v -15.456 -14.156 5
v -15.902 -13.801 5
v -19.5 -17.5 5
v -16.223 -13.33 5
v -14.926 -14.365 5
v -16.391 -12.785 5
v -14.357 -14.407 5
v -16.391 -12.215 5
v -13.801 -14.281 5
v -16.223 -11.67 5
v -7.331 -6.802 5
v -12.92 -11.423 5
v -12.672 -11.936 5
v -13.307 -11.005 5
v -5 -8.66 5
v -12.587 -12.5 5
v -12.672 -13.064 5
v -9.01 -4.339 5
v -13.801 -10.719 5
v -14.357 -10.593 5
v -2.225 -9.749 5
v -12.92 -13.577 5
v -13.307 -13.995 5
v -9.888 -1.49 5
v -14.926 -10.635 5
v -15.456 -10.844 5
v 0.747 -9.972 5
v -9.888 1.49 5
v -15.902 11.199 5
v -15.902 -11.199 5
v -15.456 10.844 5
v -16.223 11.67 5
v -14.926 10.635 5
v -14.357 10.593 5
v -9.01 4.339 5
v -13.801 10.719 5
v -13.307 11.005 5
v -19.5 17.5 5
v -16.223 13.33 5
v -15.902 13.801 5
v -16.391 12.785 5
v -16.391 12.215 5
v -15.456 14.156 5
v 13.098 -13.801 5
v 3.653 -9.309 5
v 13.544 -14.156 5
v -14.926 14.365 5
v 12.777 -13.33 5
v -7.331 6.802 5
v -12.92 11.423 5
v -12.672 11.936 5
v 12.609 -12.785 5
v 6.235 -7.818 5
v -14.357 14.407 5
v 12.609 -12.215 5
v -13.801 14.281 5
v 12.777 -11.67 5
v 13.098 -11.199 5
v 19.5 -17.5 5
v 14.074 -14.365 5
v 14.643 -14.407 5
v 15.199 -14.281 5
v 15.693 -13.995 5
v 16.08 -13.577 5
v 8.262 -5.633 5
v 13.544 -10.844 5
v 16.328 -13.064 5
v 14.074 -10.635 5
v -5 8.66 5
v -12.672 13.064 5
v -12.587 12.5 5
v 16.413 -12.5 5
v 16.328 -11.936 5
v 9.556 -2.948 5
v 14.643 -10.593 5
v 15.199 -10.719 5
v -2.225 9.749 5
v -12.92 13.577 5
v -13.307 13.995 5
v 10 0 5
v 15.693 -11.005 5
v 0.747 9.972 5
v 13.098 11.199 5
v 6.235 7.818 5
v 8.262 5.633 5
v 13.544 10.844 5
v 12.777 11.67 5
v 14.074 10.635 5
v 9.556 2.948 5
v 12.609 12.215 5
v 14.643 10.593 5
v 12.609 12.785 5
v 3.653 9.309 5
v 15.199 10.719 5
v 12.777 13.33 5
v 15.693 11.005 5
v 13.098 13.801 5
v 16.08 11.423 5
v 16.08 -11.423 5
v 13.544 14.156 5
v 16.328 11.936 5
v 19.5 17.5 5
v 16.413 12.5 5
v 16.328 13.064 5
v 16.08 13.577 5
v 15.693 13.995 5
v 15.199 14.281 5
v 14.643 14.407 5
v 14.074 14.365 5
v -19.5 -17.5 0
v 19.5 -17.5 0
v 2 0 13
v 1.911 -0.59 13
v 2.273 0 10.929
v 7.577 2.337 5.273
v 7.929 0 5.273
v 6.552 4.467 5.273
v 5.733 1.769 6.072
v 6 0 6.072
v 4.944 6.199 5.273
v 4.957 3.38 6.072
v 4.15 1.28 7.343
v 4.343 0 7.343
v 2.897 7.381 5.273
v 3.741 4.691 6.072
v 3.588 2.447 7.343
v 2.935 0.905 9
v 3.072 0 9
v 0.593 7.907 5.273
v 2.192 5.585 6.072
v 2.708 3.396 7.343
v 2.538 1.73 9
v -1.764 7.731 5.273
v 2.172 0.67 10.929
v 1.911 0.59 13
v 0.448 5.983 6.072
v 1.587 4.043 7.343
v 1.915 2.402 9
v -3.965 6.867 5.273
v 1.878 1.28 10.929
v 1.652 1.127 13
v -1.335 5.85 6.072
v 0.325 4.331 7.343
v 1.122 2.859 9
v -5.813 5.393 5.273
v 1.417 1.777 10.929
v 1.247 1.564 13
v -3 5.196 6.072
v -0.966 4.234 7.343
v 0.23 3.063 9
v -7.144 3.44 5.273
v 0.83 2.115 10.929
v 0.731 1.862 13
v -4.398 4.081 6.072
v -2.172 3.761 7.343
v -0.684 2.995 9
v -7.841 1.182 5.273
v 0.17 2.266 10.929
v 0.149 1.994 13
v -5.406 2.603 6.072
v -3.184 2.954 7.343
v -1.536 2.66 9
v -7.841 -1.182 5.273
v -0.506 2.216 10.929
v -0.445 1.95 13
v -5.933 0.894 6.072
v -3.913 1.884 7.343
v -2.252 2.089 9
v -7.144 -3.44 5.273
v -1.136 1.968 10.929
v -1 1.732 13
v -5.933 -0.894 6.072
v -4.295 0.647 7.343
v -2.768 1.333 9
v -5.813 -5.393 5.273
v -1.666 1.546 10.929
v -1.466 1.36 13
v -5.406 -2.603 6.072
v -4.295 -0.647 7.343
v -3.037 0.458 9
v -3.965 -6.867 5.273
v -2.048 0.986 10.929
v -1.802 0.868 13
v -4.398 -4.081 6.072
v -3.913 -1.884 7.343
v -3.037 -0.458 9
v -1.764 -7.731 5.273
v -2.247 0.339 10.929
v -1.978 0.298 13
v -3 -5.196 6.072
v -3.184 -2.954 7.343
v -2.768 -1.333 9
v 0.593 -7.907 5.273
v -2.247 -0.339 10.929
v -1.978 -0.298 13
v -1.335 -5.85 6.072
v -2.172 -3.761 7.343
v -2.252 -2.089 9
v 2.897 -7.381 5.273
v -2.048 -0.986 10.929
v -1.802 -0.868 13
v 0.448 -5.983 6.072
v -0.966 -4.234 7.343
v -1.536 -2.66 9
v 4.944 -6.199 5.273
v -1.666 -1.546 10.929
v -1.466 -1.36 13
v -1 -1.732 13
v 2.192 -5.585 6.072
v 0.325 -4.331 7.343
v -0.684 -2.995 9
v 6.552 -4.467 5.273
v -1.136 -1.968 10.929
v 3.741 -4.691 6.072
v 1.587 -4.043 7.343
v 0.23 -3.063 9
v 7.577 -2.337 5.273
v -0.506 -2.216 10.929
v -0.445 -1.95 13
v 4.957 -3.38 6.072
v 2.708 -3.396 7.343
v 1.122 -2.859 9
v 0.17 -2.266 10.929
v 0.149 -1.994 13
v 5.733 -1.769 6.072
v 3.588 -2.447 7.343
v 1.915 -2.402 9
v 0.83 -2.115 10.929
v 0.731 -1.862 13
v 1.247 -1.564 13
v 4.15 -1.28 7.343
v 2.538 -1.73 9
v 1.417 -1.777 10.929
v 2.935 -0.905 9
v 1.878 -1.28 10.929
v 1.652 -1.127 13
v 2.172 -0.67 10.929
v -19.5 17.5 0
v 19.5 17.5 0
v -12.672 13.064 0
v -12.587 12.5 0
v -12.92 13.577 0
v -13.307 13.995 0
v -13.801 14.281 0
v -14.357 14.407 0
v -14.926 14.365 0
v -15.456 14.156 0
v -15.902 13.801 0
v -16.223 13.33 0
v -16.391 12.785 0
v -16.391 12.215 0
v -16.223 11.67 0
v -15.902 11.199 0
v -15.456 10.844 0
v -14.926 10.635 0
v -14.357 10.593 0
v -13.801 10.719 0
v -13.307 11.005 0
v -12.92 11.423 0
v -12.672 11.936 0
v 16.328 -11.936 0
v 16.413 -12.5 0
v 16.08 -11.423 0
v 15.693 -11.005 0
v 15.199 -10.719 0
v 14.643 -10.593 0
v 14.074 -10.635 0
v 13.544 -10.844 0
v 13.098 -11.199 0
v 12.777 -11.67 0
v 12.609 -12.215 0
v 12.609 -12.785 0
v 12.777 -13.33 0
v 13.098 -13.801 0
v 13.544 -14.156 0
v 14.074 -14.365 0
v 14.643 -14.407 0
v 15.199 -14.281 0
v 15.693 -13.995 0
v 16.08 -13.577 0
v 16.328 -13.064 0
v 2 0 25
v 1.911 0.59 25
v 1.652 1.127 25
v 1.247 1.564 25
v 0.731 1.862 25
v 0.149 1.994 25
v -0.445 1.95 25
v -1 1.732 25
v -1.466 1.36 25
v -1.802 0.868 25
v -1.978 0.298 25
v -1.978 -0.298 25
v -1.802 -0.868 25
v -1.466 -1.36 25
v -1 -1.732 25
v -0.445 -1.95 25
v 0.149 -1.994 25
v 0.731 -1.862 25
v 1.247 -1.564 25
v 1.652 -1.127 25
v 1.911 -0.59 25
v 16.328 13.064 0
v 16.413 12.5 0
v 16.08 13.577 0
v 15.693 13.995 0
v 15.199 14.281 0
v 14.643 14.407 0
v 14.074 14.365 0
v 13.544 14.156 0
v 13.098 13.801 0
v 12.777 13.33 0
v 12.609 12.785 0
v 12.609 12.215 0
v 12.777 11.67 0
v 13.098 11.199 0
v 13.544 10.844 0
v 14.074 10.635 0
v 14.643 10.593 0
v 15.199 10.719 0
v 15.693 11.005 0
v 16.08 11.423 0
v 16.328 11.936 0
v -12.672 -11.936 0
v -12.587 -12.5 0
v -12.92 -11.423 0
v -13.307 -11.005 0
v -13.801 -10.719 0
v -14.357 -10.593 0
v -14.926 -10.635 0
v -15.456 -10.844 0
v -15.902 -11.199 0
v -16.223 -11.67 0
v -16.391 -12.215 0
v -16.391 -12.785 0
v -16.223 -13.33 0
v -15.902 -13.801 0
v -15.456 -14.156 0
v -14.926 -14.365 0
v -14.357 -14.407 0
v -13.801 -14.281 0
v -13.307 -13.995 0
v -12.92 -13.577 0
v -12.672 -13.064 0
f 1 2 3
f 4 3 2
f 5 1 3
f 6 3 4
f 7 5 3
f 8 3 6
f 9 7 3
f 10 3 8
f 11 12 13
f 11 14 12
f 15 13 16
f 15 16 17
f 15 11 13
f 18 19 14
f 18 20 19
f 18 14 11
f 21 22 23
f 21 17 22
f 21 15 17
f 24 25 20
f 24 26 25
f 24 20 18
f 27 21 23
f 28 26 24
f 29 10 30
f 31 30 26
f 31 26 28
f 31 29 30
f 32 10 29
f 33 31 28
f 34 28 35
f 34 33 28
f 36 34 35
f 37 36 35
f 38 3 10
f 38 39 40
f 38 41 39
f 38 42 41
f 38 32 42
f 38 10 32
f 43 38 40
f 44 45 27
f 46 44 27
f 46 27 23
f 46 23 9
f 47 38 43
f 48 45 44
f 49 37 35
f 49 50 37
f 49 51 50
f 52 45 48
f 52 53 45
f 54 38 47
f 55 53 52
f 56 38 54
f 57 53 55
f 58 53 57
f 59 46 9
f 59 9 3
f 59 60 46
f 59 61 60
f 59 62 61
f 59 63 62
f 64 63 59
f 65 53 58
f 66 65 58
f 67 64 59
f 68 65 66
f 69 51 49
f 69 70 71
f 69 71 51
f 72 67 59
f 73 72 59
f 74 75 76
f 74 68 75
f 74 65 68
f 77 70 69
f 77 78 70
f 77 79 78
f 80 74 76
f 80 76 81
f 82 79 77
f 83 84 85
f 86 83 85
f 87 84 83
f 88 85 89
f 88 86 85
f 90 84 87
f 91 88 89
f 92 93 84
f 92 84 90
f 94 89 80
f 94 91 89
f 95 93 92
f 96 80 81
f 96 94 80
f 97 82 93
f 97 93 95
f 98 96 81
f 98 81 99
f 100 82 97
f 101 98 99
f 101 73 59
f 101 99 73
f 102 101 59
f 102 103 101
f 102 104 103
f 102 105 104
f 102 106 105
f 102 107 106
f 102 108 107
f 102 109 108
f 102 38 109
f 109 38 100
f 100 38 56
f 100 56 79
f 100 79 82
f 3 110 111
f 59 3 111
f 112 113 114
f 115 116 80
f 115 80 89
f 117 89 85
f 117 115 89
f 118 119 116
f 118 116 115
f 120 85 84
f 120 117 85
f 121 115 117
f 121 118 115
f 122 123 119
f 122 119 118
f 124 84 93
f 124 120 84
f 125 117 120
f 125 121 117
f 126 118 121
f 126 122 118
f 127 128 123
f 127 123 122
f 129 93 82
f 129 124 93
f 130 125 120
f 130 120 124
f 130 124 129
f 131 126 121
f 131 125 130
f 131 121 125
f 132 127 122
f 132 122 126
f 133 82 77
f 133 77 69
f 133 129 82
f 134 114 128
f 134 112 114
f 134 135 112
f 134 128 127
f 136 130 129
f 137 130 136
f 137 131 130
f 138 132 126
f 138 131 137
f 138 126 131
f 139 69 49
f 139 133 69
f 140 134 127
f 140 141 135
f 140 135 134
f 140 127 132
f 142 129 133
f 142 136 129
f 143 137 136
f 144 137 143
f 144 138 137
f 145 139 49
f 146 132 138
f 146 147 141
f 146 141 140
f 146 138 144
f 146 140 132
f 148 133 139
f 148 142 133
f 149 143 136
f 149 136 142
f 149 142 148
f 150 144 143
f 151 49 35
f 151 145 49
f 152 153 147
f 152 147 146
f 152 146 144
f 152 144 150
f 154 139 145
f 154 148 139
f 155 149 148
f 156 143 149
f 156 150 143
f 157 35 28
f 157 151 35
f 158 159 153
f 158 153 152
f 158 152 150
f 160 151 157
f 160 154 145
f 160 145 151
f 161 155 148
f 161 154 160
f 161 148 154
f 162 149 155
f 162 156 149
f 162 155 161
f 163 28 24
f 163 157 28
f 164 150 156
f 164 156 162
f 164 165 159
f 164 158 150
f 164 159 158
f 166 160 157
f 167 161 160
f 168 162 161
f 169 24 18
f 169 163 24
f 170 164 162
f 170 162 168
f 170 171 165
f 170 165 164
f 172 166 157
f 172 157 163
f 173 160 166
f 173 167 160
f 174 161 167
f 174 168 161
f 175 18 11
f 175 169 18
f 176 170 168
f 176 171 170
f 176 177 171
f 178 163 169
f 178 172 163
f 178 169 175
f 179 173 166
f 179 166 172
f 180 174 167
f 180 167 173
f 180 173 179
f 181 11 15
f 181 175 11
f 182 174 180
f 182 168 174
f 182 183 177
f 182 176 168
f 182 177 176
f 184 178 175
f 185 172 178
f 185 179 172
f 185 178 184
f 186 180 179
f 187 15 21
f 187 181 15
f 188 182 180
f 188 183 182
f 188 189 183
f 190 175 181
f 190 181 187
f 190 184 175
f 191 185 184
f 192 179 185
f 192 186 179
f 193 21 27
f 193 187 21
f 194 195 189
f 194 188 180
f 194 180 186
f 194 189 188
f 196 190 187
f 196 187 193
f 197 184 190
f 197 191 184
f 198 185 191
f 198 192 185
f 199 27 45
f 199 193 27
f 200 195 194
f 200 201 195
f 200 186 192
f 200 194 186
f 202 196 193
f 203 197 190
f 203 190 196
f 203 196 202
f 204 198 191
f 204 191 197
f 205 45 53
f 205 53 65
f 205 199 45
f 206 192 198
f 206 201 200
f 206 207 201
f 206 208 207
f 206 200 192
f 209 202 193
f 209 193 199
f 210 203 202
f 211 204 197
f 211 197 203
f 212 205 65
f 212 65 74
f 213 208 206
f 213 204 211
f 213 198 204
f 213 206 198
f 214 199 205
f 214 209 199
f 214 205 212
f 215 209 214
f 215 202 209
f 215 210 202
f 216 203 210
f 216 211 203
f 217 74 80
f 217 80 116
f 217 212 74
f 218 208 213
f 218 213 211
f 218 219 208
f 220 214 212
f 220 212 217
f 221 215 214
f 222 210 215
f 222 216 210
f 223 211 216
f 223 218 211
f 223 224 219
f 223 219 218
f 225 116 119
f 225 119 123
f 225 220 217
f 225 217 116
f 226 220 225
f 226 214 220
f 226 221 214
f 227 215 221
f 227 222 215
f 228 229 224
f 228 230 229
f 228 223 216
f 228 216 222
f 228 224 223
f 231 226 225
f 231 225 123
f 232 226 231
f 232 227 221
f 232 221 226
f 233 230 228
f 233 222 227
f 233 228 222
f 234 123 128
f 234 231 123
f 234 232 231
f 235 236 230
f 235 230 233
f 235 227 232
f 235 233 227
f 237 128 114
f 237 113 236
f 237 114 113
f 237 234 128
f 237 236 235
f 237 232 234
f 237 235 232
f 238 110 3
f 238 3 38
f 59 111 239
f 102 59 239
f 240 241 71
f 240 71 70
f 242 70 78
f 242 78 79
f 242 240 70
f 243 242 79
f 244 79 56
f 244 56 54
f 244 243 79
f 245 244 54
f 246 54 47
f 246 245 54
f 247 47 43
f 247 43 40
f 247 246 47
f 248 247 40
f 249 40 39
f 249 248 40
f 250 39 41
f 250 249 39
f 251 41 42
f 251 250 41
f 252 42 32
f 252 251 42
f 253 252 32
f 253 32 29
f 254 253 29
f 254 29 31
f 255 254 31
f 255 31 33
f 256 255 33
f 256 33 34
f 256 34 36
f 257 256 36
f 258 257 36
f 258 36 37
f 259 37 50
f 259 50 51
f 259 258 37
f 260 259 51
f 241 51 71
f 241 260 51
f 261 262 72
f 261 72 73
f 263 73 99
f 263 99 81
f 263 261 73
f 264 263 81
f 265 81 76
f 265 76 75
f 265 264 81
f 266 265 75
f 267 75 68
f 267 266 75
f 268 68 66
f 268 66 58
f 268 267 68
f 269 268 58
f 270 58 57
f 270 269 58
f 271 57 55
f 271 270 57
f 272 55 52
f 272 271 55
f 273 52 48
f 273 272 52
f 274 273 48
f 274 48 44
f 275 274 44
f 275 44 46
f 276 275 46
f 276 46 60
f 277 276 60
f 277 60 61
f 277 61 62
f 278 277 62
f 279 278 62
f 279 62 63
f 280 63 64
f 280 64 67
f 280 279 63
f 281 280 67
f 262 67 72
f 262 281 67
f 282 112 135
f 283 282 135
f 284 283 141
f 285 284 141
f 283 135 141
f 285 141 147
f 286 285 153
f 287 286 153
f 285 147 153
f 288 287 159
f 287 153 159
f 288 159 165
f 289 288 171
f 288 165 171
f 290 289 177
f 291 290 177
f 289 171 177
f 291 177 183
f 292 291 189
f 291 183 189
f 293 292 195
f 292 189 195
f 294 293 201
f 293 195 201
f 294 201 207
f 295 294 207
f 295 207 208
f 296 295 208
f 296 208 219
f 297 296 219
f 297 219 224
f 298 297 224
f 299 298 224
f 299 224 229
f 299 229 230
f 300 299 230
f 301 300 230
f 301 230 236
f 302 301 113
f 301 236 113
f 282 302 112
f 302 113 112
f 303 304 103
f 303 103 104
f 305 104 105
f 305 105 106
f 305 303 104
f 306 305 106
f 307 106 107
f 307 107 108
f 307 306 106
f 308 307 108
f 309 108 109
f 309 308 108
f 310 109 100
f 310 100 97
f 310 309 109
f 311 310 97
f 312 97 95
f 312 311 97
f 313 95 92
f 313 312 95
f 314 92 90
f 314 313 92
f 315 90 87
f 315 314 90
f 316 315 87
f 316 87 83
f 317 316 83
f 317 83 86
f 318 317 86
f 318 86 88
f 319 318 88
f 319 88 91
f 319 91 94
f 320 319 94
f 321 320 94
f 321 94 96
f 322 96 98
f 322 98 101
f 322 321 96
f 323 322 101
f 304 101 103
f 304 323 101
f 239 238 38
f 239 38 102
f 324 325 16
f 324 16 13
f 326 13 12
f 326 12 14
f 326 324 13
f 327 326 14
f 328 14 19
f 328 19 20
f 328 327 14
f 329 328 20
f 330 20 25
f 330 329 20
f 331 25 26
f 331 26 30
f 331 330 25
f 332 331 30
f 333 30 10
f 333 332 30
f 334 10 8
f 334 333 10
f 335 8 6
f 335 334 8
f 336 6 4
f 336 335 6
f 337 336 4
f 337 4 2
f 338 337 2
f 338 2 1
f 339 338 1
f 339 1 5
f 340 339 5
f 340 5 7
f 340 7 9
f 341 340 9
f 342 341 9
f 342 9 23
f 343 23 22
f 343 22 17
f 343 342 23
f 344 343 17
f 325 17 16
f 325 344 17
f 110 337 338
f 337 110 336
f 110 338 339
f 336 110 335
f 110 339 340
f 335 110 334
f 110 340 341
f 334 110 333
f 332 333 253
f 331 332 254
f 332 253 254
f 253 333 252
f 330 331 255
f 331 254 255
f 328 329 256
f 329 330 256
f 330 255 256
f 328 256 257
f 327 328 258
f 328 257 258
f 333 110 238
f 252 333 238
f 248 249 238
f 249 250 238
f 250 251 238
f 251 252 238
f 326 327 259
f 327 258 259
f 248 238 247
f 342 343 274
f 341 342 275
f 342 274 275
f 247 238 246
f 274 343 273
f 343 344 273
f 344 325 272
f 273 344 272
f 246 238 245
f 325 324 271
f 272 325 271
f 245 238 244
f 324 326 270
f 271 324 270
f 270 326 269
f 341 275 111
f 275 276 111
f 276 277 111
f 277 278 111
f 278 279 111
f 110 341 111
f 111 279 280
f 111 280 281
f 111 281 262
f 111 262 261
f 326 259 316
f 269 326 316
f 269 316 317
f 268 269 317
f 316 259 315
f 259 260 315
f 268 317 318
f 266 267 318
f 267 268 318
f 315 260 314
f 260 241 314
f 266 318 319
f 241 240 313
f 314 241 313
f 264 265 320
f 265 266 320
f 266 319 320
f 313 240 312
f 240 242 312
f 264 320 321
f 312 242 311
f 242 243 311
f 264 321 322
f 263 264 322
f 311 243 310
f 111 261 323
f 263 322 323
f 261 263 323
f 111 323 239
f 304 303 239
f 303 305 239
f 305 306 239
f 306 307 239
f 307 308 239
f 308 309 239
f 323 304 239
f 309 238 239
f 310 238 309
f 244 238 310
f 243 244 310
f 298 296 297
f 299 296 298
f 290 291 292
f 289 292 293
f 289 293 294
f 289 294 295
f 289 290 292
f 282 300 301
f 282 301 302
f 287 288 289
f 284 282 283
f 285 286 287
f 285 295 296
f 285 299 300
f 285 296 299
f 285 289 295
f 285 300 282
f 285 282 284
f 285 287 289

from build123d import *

# Parameters (mm, degrees)
SKETCH1_W           = 39
SKETCH1_H           = 35
SKETCH1_R           = 1.912731322
BOSS_EXTRUDE1_DEPTH = 5
SKETCH2_R           = 2
BOSS_EXTRUDE2_DEPTH = 20
FILLET1_R           = 8


with BuildPart() as part:
    # Sketch1 → Boss-Extrude1 (new body)
    with BuildSketch(Plane.XY):
        Rectangle(SKETCH1_W, SKETCH1_H)
        with Locations((14.5, -12.5)):
            Circle(SKETCH1_R, mode=Mode.SUBTRACT)
        with Locations((14.5, 12.5)):
            Circle(SKETCH1_R, mode=Mode.SUBTRACT)
        with Locations((-14.5, -12.5)):
            Circle(SKETCH1_R, mode=Mode.SUBTRACT)
        with Locations((-14.5, 12.5)):
            Circle(SKETCH1_R, mode=Mode.SUBTRACT)
    extrude(amount=BOSS_EXTRUDE1_DEPTH)

    # Sketch2 → Boss-Extrude2 (add)
    with BuildSketch(Plane.XY.offset(5)):
        Circle(SKETCH2_R)
    extrude(amount=BOSS_EXTRUDE2_DEPTH)

    # Fillet1
    fillet1_edges = [part.edges().sort_by_distance(p)[0] for p in [
        (-2, 0, 5),
    ]]
    fillet(fillet1_edges, radius=FILLET1_R)


solid = part.part
